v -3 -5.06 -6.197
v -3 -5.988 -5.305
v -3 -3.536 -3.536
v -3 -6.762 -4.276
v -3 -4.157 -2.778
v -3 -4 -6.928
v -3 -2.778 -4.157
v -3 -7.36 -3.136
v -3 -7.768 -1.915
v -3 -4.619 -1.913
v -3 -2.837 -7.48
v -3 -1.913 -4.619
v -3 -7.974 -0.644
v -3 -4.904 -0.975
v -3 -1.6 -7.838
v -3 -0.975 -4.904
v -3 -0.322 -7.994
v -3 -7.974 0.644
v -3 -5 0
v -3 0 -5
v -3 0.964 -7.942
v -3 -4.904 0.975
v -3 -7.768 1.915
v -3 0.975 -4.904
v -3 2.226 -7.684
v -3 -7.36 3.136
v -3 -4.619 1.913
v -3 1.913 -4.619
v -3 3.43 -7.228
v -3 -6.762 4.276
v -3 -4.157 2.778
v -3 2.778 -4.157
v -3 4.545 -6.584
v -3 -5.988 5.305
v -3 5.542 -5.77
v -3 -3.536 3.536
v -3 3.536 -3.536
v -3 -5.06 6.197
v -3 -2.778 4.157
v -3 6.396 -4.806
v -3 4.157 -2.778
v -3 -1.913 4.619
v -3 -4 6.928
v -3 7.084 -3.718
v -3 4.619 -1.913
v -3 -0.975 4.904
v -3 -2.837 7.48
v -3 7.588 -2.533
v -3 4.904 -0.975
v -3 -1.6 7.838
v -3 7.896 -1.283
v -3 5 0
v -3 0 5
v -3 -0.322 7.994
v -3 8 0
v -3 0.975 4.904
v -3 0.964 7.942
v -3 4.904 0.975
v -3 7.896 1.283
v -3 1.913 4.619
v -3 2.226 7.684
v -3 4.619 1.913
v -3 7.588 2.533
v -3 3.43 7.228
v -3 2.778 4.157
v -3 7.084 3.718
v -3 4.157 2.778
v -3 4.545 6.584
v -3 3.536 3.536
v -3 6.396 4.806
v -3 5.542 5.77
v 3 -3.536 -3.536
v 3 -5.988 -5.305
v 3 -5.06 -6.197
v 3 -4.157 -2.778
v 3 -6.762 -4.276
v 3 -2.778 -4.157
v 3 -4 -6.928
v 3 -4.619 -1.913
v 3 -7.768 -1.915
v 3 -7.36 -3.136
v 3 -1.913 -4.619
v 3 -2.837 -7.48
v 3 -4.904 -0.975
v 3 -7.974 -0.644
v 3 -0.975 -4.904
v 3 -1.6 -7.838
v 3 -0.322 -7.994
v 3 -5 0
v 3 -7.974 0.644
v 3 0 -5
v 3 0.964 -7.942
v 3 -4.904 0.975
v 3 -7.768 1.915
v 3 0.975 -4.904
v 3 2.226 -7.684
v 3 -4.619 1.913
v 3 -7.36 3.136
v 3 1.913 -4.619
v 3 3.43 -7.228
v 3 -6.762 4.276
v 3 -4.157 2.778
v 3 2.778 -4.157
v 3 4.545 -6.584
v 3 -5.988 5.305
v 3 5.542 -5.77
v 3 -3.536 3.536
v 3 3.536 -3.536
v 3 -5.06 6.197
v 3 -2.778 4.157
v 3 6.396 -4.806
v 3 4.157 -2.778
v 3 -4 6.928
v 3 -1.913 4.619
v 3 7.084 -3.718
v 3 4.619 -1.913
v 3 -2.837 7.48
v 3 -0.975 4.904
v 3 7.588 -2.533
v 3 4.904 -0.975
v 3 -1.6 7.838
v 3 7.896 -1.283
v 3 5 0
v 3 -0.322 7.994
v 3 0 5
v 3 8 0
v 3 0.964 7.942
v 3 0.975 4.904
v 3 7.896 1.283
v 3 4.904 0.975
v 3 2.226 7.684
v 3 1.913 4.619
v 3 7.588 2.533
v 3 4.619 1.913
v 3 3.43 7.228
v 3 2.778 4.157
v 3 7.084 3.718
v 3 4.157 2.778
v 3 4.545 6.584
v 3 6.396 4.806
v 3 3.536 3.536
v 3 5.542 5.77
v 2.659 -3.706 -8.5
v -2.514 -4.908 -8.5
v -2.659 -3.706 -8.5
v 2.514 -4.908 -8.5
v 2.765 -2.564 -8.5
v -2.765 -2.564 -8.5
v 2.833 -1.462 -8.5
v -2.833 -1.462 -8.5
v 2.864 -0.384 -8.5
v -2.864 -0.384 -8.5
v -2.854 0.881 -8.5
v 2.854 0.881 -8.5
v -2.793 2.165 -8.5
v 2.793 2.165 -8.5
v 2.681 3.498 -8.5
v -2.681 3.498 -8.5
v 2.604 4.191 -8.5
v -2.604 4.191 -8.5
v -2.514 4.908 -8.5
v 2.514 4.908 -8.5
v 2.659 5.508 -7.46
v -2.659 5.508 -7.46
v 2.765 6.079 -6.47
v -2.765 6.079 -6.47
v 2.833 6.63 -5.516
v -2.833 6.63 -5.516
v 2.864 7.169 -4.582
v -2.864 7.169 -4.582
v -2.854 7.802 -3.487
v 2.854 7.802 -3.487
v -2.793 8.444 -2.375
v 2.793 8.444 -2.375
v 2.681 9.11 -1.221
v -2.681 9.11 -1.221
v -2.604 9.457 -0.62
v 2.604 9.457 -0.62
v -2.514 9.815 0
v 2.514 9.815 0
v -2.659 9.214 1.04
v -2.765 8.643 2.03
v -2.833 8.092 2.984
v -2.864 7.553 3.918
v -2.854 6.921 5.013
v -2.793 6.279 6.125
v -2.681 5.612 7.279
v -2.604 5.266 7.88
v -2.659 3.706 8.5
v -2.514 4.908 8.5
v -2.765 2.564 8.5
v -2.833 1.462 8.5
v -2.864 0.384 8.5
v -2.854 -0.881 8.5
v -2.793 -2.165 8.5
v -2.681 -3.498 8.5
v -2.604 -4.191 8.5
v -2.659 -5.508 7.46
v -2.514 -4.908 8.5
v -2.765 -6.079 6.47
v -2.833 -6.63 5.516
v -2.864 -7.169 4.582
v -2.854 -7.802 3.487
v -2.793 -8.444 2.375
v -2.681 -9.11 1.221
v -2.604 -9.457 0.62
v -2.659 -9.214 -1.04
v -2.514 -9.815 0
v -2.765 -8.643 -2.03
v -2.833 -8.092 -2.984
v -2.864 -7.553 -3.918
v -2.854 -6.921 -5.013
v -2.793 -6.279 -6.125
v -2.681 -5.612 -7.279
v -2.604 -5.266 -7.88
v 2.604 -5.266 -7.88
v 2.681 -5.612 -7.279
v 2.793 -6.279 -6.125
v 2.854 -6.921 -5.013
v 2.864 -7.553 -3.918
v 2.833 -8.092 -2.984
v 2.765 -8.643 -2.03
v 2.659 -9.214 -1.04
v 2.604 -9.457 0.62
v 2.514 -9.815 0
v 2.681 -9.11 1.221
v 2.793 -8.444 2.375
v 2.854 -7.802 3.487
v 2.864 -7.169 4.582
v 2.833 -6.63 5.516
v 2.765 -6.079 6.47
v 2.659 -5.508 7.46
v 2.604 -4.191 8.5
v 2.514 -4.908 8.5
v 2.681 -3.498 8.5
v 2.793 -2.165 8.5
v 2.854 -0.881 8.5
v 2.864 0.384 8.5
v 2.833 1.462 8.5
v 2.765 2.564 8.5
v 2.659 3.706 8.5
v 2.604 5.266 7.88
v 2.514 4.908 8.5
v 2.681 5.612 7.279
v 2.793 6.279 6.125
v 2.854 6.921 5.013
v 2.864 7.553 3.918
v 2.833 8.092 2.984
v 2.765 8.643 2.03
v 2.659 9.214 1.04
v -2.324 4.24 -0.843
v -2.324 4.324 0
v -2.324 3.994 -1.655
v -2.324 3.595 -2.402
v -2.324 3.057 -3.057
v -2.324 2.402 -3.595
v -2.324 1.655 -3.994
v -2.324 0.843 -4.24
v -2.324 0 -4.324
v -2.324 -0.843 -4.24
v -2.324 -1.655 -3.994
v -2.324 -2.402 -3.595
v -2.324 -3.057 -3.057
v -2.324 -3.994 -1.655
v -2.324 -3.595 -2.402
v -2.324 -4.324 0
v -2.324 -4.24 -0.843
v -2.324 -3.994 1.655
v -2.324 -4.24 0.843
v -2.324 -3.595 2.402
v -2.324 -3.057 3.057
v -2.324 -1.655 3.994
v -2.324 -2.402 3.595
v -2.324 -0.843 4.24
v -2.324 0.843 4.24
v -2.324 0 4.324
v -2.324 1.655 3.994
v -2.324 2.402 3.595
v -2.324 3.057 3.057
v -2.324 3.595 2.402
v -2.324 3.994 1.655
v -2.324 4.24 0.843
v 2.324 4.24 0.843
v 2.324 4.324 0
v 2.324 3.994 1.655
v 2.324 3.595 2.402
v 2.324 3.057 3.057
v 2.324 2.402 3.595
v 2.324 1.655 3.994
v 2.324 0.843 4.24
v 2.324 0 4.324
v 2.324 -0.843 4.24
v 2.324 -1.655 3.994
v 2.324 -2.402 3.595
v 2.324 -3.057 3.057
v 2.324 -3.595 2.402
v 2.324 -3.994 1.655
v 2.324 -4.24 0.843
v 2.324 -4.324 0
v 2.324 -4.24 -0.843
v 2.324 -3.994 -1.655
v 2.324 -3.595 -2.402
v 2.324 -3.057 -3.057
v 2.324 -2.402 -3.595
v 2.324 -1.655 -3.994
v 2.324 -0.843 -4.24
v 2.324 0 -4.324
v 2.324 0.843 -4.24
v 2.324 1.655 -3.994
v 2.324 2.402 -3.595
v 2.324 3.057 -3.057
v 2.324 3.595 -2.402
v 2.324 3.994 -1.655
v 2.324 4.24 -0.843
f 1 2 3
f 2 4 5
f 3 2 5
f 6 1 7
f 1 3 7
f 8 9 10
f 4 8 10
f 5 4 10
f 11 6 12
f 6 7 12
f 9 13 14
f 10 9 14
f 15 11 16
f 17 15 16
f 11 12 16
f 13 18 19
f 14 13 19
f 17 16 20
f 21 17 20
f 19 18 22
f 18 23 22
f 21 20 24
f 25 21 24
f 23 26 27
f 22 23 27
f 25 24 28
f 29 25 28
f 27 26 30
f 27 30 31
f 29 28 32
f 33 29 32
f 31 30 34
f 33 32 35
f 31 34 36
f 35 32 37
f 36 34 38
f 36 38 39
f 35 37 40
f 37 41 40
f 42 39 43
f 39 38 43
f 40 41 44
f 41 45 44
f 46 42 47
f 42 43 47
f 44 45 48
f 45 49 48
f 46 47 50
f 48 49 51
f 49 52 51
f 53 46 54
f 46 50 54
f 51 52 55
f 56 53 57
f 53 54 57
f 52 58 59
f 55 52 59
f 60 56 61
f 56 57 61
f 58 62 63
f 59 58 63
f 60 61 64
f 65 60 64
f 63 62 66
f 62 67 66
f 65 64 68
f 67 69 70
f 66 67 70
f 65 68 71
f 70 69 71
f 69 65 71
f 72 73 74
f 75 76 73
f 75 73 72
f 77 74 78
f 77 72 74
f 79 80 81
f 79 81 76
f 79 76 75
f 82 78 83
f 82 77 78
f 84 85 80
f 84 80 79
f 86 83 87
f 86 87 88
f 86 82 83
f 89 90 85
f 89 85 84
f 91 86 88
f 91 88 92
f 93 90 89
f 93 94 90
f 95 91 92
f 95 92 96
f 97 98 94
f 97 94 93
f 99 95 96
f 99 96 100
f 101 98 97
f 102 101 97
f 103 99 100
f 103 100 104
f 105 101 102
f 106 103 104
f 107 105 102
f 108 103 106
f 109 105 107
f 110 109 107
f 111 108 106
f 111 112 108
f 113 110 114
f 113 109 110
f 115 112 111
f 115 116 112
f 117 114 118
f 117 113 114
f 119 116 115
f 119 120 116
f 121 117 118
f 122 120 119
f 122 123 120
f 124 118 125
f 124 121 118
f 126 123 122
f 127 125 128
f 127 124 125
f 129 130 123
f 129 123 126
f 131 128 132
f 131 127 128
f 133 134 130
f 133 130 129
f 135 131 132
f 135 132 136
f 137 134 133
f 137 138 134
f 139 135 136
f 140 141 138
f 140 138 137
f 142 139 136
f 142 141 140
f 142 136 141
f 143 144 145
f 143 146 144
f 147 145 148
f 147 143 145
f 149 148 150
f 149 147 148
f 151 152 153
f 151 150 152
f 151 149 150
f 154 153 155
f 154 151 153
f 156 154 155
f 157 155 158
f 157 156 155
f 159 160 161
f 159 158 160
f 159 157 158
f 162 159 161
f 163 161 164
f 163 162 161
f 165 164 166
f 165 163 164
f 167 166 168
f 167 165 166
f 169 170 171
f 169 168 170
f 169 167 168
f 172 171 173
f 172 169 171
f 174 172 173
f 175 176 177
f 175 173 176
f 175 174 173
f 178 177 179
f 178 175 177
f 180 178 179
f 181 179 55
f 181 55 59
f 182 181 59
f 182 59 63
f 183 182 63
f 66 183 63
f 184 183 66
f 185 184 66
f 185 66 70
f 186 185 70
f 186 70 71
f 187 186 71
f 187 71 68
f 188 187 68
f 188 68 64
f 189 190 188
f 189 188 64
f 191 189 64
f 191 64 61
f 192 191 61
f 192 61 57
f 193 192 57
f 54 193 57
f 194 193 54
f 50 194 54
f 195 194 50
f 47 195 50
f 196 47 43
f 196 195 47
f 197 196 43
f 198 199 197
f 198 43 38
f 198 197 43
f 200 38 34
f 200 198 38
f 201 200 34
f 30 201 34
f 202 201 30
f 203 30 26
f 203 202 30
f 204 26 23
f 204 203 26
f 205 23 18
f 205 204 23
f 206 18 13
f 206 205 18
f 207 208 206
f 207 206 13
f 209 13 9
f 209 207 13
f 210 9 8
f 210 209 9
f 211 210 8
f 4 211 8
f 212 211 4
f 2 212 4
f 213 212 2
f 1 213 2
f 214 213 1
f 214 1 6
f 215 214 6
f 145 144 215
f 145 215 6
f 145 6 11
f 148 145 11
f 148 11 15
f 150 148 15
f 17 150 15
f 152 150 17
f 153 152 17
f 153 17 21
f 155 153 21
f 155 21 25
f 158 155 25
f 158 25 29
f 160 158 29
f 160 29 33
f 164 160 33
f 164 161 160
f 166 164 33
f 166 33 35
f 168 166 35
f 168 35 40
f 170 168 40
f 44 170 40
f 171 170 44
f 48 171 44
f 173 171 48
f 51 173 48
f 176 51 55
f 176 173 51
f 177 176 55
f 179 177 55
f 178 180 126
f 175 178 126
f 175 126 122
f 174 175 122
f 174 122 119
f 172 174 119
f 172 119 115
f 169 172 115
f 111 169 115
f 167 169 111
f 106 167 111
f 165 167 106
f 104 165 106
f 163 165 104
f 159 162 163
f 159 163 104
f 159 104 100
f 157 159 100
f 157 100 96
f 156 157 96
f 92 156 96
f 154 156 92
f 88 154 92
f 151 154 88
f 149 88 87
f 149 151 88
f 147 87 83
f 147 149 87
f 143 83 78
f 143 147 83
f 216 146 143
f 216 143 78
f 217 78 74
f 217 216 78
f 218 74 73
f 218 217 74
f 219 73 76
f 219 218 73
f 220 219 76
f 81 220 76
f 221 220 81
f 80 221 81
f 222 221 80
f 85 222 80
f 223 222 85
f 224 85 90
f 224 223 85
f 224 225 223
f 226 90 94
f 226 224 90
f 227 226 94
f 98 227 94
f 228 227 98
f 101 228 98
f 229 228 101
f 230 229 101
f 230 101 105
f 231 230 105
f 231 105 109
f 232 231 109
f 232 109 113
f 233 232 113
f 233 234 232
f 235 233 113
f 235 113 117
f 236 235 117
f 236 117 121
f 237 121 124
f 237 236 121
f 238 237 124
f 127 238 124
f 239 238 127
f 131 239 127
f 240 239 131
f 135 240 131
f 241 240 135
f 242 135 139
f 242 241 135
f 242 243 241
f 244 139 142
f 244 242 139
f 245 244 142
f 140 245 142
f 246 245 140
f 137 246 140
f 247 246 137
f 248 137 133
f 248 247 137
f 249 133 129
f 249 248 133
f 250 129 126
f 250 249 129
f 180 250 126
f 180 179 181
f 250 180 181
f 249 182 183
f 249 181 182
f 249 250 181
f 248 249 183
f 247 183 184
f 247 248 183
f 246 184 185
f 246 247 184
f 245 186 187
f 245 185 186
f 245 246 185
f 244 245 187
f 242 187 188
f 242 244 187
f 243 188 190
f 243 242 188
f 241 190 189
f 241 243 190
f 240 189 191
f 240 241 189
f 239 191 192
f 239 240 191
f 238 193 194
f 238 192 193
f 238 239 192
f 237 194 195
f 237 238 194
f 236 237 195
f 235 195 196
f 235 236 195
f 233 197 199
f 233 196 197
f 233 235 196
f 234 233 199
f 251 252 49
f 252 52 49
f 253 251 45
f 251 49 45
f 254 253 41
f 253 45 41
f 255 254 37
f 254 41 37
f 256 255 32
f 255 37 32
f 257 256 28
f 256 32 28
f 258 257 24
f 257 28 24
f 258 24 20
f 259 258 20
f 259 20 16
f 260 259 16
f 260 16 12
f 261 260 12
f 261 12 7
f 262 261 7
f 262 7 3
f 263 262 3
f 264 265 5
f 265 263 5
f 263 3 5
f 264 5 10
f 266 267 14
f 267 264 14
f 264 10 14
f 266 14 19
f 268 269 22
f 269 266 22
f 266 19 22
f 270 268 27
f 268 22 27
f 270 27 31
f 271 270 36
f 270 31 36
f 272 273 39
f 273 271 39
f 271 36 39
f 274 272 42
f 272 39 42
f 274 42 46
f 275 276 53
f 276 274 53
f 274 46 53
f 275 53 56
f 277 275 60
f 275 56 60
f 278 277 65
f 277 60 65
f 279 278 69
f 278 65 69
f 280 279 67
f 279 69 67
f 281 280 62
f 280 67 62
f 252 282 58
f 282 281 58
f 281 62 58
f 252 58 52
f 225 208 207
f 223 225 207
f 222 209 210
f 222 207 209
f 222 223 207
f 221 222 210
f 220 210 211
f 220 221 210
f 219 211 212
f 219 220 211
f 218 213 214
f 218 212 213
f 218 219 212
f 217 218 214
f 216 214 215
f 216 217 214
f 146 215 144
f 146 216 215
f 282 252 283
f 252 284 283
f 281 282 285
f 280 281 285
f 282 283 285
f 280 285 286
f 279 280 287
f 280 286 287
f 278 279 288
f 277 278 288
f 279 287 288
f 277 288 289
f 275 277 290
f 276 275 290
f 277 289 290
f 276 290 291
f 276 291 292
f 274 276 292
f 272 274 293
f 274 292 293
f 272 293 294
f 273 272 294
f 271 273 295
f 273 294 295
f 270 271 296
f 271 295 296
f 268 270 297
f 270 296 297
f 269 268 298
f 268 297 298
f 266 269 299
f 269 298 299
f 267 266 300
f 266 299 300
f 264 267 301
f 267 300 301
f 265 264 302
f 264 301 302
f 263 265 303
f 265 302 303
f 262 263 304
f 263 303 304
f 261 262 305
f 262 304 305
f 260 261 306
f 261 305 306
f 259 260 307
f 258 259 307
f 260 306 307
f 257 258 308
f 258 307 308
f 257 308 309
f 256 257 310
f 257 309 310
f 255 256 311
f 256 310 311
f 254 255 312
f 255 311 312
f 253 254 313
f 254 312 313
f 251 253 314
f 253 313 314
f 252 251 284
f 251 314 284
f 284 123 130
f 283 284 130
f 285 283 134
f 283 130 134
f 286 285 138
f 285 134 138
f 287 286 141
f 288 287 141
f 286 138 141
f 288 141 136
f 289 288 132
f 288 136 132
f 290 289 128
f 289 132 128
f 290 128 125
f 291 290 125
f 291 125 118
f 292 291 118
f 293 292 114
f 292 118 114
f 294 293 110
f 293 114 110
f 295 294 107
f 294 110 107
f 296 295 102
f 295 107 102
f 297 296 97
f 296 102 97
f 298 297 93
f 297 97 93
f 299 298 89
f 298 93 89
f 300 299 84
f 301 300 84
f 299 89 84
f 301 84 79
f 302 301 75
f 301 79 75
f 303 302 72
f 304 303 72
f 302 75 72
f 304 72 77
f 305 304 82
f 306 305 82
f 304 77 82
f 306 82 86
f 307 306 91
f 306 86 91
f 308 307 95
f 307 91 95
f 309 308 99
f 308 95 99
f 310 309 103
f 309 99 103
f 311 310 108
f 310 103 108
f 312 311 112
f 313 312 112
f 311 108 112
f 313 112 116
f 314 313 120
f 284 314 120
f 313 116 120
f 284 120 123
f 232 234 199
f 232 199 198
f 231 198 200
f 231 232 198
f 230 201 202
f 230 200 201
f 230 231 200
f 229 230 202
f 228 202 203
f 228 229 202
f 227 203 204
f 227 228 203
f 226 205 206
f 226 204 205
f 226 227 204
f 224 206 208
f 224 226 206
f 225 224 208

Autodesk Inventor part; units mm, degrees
sketch "Sketch_2" plane through (0, 0, 0) normal (0, 0, 1) x (1, 0, 0)
  line L0 (3, 0) -> (-3, 0)
  line L1 (-3, 8) -> (-3, 5)
  line L2 (-3, 5) -> (-2.3235, 4.3235)
  line L3 (-2.3235, 4.3235) -> (2.3235, 4.3235)
  line L4 (2.3235, 4.3235) -> (3, 5)
  line L5 (3, 5) -> (3, 8)
  line L6 (3, 8) -> (1.955, 11.9)
  line L7 (1.955, 11.9) -> (-1.955, 11.9)
  line L8 (-1.955, 11.9) -> (-3, 8)
revolve "Revolution1" add sketch "Sketch_2" angle 360 about axis through (3, 0, 0) along (1, 0, 0)
thread "Thread1" size "M10x1.25" class "6H" standard "ISO Metric profile" full length
sketch "Sketch_3" plane through (0, 0, 0) normal (1, 0, 0) x (0, 1, 0)
  circle A0 centre (0, 0) radius 17
  line L0 (-4.9075, 8.5) -> (-9.815, 0)
  line L1 (-9.815, 0) -> (-4.9075, -8.5)
  line L2 (-4.9075, -8.5) -> (4.9075, -8.5)
  line L3 (4.9075, -8.5) -> (9.815, 0)
  line L4 (9.815, 0) -> (4.9075, 8.5)
  line L5 (4.9075, 8.5) -> (-4.9075, 8.5)
extrude "Extrusion1" cut sketch "Sketch_3" along normal mid plane 6
ref_plane "NUT_ROD_XY" through (0, 0, 0) normal (1, 0, 0) x (0, 0, -1)
ref_plane "NUT_ROD_YZ" through (0, 0, 0) normal (0, 0, -1) x (0, 1, 0)
ref_plane "NUT_ROD_ZX" through (0, 0, 0) normal (0, 1, 0) x (1, 0, 0)
properties part number "C96S32_NUT"
